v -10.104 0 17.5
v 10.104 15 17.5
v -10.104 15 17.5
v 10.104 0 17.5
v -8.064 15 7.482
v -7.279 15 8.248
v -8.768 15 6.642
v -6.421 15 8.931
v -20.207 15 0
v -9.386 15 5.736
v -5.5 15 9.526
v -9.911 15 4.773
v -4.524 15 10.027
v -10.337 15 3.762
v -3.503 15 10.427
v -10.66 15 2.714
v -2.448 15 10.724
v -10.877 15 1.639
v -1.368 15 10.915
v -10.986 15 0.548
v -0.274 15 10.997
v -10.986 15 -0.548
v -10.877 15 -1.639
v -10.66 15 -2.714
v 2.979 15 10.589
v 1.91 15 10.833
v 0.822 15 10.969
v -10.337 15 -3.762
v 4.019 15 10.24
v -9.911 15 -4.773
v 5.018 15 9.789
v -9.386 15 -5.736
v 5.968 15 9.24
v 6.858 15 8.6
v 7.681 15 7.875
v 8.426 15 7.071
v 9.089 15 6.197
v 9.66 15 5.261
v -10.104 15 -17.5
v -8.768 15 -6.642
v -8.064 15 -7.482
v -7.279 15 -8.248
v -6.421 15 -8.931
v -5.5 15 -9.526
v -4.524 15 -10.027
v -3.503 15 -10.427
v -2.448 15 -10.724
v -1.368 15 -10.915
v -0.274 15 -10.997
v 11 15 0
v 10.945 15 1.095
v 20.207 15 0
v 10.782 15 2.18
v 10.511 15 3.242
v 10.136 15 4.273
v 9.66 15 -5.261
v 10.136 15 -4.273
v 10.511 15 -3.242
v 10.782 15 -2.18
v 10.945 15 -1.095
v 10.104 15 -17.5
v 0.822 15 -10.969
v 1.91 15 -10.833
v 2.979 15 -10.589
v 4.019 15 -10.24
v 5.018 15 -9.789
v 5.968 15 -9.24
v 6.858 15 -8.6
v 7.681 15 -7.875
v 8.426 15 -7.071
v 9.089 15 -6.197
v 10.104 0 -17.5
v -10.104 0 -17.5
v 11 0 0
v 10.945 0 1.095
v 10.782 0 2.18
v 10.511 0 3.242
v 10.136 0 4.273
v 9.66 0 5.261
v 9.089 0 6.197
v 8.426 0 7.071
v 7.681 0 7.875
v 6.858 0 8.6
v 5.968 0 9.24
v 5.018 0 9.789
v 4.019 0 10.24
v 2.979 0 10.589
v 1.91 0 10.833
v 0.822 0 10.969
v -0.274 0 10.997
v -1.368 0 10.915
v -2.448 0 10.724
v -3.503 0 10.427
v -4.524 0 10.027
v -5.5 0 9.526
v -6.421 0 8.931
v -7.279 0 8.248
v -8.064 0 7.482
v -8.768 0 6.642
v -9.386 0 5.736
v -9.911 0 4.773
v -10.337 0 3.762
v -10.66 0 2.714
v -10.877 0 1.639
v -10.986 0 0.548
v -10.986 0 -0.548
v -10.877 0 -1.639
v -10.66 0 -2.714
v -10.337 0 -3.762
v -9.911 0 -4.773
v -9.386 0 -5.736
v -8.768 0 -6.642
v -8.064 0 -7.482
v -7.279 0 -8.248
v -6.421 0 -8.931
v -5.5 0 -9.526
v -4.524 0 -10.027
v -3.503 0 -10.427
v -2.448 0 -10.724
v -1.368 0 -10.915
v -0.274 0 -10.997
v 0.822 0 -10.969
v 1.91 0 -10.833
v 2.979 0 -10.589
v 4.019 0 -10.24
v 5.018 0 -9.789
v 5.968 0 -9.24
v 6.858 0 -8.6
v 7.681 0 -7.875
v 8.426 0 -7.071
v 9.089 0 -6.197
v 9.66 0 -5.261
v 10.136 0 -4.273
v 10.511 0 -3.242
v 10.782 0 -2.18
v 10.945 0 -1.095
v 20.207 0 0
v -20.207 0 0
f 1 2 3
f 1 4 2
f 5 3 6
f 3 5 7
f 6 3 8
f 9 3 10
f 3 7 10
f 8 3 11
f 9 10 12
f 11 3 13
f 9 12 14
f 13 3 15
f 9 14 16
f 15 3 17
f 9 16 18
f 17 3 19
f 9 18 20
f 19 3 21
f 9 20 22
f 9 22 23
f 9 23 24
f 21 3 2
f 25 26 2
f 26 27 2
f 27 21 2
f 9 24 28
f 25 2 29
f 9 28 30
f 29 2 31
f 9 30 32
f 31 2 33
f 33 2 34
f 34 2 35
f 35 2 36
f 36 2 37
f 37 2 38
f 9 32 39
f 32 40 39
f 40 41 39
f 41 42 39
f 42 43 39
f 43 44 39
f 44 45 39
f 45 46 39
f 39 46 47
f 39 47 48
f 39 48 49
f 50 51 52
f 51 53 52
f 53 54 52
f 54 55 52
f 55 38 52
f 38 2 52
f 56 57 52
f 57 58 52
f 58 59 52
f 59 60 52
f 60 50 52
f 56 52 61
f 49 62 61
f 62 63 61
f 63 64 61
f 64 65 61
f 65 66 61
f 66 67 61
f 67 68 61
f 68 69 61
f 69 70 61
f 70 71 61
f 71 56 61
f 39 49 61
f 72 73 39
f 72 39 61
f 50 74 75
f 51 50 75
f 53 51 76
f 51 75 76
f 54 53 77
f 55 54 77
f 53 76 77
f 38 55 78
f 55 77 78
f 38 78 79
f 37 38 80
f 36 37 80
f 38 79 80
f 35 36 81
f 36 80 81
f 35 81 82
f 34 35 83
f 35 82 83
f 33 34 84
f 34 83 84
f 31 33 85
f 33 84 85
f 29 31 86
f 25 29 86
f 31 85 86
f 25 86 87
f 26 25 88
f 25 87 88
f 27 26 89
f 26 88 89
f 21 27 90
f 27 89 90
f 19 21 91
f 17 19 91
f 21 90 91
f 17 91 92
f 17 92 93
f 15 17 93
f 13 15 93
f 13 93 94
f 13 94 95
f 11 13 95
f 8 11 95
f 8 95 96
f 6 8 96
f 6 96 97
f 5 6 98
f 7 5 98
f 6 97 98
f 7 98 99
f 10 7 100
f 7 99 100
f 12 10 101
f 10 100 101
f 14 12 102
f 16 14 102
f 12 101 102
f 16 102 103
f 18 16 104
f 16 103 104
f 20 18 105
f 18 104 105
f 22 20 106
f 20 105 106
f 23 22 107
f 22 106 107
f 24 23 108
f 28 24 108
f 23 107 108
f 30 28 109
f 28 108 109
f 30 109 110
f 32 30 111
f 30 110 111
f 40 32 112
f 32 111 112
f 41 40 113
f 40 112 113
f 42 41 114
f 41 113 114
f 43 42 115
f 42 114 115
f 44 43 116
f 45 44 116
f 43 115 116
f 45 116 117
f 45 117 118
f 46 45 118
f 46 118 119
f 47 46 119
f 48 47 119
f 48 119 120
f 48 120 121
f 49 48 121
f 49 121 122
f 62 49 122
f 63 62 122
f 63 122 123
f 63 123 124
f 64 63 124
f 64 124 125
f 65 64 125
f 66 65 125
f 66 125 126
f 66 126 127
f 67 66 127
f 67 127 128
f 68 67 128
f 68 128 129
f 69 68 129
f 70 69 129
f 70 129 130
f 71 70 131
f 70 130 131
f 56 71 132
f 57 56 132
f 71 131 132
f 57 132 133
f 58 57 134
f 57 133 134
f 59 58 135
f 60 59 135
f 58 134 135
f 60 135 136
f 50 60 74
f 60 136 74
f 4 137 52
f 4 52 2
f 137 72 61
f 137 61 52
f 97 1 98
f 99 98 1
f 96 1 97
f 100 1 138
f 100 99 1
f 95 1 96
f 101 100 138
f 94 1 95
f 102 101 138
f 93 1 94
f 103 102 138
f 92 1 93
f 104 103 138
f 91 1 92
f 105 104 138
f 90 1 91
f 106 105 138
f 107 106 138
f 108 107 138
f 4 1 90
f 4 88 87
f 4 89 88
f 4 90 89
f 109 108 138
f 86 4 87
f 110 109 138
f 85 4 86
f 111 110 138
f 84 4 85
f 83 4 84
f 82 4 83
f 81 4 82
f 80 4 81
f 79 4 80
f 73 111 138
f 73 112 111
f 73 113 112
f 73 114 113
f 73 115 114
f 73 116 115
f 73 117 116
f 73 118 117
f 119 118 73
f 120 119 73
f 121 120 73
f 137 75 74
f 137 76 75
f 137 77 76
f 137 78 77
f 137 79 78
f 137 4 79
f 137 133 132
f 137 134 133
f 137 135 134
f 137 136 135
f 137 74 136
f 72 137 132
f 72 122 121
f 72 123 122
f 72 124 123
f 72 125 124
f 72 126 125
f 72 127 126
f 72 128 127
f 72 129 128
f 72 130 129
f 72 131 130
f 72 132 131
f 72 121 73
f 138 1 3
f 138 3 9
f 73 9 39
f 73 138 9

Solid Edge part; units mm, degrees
sketch "Sketch1" plane through (0, 0, 0) normal (0, -1, 0) x (1, 0, 0)
  line L0 (-10.1036, 17.5) -> (-20.2073, 0)
  line L1 (-20.2073, 0) -> (-10.1036, -17.5)
  line L2 (-10.1036, -17.5) -> (10.1036, -17.5)
  line L3 (10.1036, -17.5) -> (20.2073, 0)
  line L4 (20.2073, 0) -> (10.1036, 17.5)
  line L5 (10.1036, 17.5) -> (-10.1036, 17.5)
extrude "Protrusion1" add sketch "Sketch1" against normal blind 15
sketch "Sketch2" plane through (0, 0, 0) normal (0, -1, 0) x (1, 0, 0)
  circle A0 centre (0, 0) radius 11
extrude "ExtrudedCutout_1" cut sketch "Sketch2" against normal blind 49.2939
cosmetic_thread "Thread1" size "M22"
